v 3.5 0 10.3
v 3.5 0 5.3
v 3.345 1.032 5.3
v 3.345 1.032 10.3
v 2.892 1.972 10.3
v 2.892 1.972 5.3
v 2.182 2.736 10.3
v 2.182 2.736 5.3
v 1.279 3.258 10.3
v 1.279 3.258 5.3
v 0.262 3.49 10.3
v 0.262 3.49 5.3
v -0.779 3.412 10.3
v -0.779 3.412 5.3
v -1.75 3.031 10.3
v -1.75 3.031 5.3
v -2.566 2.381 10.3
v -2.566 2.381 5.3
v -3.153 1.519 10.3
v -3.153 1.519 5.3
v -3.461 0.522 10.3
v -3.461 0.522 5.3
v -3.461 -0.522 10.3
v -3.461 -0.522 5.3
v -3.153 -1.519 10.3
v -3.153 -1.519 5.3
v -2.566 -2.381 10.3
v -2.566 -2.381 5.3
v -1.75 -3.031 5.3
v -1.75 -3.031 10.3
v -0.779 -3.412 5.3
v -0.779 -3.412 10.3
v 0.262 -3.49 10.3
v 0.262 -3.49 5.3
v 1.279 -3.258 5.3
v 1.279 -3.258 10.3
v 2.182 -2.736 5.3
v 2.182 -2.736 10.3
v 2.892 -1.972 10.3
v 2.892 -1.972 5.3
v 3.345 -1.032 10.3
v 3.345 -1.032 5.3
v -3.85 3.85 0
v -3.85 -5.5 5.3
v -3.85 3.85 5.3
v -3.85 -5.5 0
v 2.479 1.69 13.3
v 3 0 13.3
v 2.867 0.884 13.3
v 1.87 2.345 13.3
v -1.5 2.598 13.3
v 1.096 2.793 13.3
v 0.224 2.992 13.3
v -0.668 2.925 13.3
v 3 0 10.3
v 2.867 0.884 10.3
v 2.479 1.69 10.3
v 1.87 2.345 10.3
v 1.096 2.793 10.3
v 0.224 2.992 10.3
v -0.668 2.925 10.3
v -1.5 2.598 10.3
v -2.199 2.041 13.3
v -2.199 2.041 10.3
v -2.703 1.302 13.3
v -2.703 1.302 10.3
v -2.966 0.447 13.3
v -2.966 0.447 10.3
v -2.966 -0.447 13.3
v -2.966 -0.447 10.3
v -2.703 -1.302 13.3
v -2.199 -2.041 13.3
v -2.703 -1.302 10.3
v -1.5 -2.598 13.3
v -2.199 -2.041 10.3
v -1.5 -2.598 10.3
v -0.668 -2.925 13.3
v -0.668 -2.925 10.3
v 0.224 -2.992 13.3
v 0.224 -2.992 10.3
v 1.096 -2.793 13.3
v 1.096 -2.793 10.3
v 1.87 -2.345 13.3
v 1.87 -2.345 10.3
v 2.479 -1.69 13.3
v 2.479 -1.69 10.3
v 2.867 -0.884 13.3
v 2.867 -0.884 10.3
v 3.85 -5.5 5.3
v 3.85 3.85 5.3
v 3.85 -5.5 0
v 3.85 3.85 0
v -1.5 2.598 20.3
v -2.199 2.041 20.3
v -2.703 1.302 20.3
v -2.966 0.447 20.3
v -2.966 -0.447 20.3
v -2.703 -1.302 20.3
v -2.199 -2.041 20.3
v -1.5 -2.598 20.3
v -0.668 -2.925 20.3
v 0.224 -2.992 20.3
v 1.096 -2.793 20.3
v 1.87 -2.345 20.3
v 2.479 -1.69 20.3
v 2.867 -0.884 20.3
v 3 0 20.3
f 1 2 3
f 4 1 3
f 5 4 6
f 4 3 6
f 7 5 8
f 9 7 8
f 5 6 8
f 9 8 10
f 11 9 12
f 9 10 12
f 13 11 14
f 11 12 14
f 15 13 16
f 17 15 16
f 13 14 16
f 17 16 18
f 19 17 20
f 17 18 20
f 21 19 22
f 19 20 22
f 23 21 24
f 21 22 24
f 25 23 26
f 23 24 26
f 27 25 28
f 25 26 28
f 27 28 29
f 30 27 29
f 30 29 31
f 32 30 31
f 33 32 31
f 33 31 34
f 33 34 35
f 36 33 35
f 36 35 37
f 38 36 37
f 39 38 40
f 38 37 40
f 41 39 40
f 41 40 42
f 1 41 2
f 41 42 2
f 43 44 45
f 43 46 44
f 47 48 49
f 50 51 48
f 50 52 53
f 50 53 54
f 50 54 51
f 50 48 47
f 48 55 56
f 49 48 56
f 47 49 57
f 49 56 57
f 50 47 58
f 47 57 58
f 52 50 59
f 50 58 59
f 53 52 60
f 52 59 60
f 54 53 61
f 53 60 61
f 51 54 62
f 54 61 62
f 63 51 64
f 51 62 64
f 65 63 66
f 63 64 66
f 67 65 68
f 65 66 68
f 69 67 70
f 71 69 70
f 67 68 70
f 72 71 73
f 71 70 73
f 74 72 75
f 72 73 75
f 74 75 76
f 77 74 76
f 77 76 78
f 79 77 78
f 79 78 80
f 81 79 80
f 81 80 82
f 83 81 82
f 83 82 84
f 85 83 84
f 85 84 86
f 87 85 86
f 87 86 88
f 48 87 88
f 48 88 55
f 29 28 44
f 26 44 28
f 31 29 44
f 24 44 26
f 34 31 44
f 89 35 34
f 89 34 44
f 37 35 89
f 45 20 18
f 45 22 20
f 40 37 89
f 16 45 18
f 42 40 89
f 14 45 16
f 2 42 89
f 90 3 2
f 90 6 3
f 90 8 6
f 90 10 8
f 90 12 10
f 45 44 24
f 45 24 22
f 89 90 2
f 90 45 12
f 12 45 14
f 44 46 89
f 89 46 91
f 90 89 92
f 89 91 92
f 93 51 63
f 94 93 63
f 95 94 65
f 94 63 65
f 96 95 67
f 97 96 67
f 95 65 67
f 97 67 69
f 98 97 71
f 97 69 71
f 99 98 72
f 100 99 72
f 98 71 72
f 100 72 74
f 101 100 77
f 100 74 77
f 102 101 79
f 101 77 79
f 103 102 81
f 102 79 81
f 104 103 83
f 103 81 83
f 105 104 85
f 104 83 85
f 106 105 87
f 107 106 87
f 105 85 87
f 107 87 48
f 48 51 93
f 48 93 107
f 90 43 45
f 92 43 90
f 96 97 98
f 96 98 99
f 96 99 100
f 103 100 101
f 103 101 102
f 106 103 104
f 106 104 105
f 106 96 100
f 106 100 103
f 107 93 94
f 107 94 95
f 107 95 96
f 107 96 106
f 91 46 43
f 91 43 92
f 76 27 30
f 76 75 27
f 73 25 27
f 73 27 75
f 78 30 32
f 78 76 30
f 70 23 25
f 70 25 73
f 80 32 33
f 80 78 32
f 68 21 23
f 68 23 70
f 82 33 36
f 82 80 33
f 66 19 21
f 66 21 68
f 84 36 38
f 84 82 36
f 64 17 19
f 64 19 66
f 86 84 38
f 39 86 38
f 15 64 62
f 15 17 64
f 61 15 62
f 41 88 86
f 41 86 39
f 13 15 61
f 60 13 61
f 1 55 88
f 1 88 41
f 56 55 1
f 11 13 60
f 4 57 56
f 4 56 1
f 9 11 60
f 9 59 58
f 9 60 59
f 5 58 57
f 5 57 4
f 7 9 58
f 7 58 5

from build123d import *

# Parameters (mm, degrees)
SKETCH002_W  = 7.7
SKETCH002_H  = 9.35
PAD_DEPTH    = 1
SKETCH003_W  = 7.7
SKETCH003_H  = 9.35
PAD001_DEPTH = 2.5
SKETCH004_W  = 7.7
SKETCH004_H  = 9.35
PAD002_DEPTH = 1.8
SKETCH005_R  = 3.5
PAD003_DEPTH = 5
SKETCH006_R  = 3.000001
PAD004_DEPTH = 3
PAD005_DEPTH = 7


with BuildPart() as part:
    # Sketch002 (on DatumPlane) → Pad (new body)
    with BuildSketch(Plane.XY):
        with Locations((0, -0.825)):
            Rectangle(SKETCH002_W, SKETCH002_H)
    extrude(amount=PAD_DEPTH)

    # Sketch003 (on DatumPlane) → Pad001 (join)
    with BuildSketch(Plane.XY.offset(1)):
        with Locations((0, -0.825)):
            Rectangle(SKETCH003_W, SKETCH003_H)
    extrude(amount=PAD001_DEPTH)

    # Sketch004 (on DatumPlane) → Pad002 (join)
    with BuildSketch(Plane.XY.offset(3.5)):
        with Locations((0, -0.825)):
            Rectangle(SKETCH004_W, SKETCH004_H)
    extrude(amount=PAD002_DEPTH)

    # Sketch005 (on DatumPlane) → Pad003 (join)
    with BuildSketch(Plane.XY.offset(5.3)):
        Circle(SKETCH005_R)
    extrude(amount=PAD003_DEPTH)

    # Sketch006 (on DatumPlane) → Pad004 (join)
    with BuildSketch(Plane.XY.offset(10.3)):
        Circle(SKETCH006_R)
    extrude(amount=PAD004_DEPTH)

    # Sketch007 (on DatumPlane) → Pad005 (join)
    with BuildSketch(Plane.XY.offset(13.3)):
        with BuildLine():
            ThreePointArc((-1.500001, 2.598077), (-1.500001, -2.598077), (3.000001, -1e-06))
            Line((-1.500001, 2.598077), (3.000001, -1e-06))
        make_face()
    extrude(amount=PAD005_DEPTH)


solid = part.part
